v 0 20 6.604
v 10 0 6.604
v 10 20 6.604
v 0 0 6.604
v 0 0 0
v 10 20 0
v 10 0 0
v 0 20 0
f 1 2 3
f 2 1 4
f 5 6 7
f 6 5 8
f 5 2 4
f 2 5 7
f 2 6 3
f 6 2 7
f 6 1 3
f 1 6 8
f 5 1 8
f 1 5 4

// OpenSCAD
// [x, y, z] = [width, depth, height]

base_height = 6.604;
cube([10, 20, base_height]);
